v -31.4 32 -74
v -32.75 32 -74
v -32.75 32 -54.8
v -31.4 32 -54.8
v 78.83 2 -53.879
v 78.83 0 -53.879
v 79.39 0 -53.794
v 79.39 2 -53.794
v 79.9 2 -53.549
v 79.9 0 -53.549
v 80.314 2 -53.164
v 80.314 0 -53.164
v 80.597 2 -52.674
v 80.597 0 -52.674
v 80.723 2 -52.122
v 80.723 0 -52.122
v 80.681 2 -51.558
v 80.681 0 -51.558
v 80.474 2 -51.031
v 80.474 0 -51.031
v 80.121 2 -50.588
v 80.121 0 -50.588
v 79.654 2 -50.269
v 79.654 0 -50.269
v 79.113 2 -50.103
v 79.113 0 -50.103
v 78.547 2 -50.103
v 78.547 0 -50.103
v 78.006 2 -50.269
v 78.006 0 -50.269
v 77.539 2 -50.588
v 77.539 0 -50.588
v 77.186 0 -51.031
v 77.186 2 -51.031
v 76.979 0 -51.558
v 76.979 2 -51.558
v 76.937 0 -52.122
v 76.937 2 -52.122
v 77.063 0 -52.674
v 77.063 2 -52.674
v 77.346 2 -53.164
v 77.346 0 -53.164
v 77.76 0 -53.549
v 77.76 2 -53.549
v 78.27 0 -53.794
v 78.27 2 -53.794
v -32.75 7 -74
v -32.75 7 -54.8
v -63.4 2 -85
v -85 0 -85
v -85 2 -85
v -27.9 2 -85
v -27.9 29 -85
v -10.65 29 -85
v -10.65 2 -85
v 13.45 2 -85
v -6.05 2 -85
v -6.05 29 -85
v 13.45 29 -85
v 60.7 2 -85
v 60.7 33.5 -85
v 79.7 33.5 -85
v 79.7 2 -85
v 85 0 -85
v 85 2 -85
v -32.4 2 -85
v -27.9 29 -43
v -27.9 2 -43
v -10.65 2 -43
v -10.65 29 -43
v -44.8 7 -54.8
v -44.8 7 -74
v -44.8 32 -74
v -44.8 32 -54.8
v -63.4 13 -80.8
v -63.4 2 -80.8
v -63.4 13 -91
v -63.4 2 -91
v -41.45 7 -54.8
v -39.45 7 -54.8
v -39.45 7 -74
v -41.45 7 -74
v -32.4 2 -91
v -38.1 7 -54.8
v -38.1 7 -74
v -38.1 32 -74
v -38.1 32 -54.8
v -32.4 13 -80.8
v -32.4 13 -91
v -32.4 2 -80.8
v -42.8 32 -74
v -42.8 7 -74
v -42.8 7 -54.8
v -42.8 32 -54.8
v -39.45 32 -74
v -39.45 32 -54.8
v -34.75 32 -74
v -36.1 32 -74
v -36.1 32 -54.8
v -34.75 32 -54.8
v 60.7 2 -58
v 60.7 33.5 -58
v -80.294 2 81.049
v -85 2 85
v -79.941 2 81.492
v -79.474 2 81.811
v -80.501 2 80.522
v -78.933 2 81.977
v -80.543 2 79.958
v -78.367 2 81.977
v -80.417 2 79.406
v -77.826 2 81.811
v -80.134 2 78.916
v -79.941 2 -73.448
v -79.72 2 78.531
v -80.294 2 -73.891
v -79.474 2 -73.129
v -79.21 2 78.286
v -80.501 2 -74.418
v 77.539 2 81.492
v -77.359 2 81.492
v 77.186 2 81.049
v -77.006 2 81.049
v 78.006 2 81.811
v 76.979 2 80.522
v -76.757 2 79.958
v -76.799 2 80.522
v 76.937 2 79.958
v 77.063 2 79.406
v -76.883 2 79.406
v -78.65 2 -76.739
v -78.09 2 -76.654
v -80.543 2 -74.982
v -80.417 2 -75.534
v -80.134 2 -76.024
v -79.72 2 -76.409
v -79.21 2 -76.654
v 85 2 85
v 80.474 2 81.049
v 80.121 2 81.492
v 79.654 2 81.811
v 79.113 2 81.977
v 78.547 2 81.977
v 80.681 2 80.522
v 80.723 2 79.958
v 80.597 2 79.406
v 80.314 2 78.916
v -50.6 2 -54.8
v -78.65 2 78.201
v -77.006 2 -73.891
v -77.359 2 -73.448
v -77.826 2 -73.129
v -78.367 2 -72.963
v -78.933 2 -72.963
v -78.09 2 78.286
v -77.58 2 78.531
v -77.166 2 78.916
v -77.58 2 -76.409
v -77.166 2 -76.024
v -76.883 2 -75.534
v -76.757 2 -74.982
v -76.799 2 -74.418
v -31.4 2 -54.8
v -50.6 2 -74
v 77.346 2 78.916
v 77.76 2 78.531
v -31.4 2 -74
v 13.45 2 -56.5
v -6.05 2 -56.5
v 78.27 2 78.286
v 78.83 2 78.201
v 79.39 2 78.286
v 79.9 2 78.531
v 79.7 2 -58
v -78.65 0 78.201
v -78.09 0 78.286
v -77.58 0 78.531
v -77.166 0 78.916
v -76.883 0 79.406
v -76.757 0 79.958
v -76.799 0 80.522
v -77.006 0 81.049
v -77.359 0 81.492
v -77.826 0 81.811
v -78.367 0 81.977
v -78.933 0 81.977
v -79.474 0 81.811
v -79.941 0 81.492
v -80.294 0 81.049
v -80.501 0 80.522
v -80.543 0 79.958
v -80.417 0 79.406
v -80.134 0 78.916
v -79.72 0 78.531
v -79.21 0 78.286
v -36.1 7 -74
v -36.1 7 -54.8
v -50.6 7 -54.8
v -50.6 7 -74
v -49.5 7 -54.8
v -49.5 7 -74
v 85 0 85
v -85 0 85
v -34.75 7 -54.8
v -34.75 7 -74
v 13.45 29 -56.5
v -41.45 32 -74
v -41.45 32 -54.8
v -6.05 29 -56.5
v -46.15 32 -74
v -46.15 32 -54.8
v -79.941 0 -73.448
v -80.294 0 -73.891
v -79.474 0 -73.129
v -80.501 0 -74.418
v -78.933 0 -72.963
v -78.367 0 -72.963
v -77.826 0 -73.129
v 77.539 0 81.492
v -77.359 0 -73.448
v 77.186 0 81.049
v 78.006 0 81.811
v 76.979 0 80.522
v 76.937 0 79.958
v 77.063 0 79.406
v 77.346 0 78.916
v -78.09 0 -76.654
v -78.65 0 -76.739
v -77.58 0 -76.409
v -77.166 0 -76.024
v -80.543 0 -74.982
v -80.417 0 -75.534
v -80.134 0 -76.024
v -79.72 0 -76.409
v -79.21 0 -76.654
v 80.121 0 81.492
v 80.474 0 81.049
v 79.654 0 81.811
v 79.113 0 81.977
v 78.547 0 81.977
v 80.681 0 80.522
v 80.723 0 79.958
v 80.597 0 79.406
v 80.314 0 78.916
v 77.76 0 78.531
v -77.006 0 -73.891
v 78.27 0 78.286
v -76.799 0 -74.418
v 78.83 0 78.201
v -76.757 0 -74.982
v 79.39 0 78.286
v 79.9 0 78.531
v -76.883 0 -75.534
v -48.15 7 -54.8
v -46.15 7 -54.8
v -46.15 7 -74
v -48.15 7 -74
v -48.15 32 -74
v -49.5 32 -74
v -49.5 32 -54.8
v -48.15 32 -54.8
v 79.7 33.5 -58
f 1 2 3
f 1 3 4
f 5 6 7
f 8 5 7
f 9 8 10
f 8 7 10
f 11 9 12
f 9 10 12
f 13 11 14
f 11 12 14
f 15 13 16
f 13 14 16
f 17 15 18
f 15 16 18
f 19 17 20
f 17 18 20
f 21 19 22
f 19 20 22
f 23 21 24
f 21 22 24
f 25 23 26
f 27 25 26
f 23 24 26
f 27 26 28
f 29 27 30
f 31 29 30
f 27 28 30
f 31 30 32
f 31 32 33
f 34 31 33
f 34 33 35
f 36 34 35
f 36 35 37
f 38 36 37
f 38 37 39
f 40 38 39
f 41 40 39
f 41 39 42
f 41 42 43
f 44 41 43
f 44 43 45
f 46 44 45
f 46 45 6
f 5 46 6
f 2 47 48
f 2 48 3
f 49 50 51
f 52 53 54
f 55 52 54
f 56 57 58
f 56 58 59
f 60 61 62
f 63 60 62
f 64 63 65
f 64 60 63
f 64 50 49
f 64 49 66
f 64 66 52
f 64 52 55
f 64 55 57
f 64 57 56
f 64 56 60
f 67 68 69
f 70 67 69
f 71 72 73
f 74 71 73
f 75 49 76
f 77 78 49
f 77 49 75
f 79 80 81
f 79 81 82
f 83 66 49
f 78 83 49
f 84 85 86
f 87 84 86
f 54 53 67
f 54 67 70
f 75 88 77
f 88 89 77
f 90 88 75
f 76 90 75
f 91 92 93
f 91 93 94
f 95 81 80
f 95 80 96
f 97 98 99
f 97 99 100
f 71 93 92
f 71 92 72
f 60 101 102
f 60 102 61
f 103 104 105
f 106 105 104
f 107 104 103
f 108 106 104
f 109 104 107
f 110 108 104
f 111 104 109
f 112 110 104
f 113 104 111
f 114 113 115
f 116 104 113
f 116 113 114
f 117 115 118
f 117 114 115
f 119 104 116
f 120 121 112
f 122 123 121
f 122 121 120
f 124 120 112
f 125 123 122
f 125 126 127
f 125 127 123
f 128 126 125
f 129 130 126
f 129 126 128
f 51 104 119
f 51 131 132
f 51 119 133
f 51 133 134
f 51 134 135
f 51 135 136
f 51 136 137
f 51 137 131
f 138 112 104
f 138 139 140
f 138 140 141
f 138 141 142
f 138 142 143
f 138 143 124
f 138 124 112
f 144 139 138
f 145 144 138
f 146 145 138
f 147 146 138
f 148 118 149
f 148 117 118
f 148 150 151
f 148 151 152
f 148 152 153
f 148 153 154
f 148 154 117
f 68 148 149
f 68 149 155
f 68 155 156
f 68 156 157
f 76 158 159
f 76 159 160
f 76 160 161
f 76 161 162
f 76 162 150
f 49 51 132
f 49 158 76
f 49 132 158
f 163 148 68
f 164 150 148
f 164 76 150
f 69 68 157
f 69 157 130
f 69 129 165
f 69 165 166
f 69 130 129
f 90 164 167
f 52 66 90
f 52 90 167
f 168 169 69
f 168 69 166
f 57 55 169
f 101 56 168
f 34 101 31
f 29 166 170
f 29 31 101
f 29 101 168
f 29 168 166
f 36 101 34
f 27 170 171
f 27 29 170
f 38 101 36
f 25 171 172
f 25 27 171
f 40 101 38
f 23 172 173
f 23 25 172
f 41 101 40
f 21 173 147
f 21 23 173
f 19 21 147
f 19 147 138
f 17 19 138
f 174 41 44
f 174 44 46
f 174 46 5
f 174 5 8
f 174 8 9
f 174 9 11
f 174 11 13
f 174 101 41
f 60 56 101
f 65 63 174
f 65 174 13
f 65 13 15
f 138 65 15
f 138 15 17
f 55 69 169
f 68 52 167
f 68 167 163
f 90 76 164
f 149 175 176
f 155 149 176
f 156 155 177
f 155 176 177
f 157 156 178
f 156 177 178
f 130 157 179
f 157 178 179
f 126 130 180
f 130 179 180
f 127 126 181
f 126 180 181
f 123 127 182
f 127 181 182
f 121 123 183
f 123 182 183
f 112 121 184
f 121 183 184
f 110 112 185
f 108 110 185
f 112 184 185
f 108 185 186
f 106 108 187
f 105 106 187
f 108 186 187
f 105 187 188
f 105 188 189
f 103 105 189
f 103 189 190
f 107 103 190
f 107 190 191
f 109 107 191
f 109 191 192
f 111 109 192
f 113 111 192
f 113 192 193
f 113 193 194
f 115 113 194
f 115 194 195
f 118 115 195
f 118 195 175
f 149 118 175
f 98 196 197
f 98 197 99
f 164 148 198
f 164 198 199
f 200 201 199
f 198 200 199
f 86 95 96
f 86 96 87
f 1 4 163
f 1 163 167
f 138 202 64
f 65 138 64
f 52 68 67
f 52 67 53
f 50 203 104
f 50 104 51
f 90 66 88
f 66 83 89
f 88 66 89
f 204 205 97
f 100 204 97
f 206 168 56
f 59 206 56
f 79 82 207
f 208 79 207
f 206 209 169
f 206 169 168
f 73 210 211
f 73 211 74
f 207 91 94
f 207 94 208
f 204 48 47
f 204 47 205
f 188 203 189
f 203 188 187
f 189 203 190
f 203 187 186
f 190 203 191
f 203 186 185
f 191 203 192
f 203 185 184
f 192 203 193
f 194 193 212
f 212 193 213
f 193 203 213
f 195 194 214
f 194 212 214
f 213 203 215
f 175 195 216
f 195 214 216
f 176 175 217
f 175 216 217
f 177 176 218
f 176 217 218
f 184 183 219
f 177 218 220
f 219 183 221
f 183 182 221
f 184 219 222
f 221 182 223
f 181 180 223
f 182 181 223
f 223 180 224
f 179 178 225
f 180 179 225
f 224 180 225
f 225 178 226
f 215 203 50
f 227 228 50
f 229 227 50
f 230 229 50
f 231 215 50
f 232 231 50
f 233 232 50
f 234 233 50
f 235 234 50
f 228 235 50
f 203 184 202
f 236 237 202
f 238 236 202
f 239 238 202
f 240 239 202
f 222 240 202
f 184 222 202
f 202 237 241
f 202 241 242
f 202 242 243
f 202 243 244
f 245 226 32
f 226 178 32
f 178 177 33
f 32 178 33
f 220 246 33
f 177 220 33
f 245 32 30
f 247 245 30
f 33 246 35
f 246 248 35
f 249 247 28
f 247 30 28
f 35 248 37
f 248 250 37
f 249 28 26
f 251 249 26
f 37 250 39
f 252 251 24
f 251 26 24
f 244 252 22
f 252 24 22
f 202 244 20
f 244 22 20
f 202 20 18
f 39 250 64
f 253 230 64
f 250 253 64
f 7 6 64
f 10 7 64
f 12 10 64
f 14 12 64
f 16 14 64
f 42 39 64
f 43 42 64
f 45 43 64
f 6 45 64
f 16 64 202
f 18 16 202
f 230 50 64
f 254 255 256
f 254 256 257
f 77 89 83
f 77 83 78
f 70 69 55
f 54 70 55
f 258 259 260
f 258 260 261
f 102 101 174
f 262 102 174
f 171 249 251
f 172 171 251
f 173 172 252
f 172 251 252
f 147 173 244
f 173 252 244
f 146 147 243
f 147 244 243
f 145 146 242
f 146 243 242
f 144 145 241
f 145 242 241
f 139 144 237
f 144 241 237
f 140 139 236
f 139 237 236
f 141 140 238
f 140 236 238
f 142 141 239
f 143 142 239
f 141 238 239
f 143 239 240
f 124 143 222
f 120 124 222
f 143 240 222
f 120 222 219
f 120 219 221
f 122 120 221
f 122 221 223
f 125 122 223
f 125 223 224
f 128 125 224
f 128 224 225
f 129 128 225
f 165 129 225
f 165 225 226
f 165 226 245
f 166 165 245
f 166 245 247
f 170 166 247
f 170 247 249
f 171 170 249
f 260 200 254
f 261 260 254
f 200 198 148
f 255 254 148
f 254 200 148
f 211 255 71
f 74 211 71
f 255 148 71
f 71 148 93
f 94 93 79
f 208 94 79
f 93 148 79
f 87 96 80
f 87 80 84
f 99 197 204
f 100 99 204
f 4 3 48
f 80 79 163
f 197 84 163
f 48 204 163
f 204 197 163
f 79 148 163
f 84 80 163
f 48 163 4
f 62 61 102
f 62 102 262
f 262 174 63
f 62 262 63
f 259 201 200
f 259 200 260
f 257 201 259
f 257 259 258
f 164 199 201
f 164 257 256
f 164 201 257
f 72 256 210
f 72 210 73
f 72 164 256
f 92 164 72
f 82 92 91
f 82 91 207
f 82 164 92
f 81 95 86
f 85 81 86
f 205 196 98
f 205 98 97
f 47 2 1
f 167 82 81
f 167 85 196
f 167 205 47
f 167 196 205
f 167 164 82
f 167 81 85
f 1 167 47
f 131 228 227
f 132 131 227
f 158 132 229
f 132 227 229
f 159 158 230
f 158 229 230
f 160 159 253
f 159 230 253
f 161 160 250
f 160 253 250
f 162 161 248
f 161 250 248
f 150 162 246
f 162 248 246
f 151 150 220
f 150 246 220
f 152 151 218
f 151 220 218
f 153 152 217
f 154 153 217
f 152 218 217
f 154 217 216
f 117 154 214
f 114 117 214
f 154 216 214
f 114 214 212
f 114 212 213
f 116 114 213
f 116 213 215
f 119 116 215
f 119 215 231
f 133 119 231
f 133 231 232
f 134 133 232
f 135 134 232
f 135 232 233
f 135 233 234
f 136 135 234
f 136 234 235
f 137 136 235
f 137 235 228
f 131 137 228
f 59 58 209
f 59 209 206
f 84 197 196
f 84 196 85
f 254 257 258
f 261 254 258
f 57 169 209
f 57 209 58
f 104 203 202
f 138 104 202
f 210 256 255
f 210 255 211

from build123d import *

# Parameters (mm, degrees)
SKETCH1_W                = 170
SKETCH1_H                = 170
BOSS_EXTRUDE1_DEPTH      = 2
F_6_CLEARANCE_HOLE1_D    = 3.7973
SKETCH5_W                = 19
SKETCH5_H                = 27
BOSS_EXTRUDE2_DEPTH      = 31.5
SKETCH6_W                = 19.5
SKETCH6_H                = 28.5
SKETCH6_W_2              = 17.25
SKETCH6_H_2              = 42
BOSS_EXTRUDE3_DEPTH      = 27
SKETCH7_W                = 19.2
SKETCH7_H                = 19.2
BOSS_EXTRUDE4_DEPTH      = 30
SKETCH8_W                = 2
SKETCH8_H                = 25
SKETCH8_W_2              = 1.1
CUT_EXTRUDE1_DEPTH       = 160
SKETCH9_W                = 31
SKETCH9_H                = 11
BOSS_EXTRUDE5_DEPTH      = 6
BOSS_EXTRUDE5_DEPTH_BACK = 4.2


with BuildPart() as part:
    # Sketch1 → Boss-Extrude1 (new body)
    with BuildSketch(Plane(origin=(0, 0, 0), x_dir=(1, 0, 0), z_dir=(0, 1, 0))):
        Rectangle(SKETCH1_W, SKETCH1_H)
    extrude(amount=BOSS_EXTRUDE1_DEPTH)

    # #6 Clearance Hole1 (through all)
    with Locations(Plane(origin=(-78.65, 2, -74.84), x_dir=(0, 0, 1), z_dir=(0, 1, 0))):
        with Locations((0, 0), (154.94, 0), (154.94, 157.48), (22.86, 157.48)):
            Hole(F_6_CLEARANCE_HOLE1_D / 2)

    # Sketch5 → Boss-Extrude2 (add)
    with BuildSketch(Plane(origin=(0, 2, 0), x_dir=(1, 0, 0), z_dir=(0, 1, 0))):
        with Locations((70.2, 71.5)):
            Rectangle(SKETCH5_W, SKETCH5_H)
    extrude(amount=BOSS_EXTRUDE2_DEPTH)

    # Sketch6 → Boss-Extrude3 (add)
    with BuildSketch(Plane(origin=(0, 2, 0), x_dir=(1, 0, 0), z_dir=(0, 1, 0))):
        with Locations((3.7, 70.75)):
            Rectangle(SKETCH6_W, SKETCH6_H)
        with Locations((-19.275, 64)):
            Rectangle(SKETCH6_W_2, SKETCH6_H_2)
    extrude(amount=BOSS_EXTRUDE3_DEPTH)

    # Sketch7 → Boss-Extrude4 (add)
    with BuildSketch(Plane(origin=(0, 2, 0), x_dir=(1, 0, 0), z_dir=(0, 1, 0))):
        with Locations((-41, 64.4)):
            Rectangle(SKETCH7_W, SKETCH7_H)
    extrude(amount=BOSS_EXTRUDE4_DEPTH)

    # Sketch8 → Cut-Extrude1 (cut, through all)
    with BuildSketch(Plane(origin=(0, 0, -74), x_dir=(-1, 0, 0), z_dir=(0, 0, -1))):
        with Locations((33.75, 19.5)):
            Rectangle(SKETCH8_W, SKETCH8_H)
        with Locations((37.1, 19.5)):
            Rectangle(SKETCH8_W, SKETCH8_H)
        with Locations((50.05, 19.5)):
            Rectangle(SKETCH8_W_2, SKETCH8_H)
        with Locations((40.45, 19.5)):
            Rectangle(SKETCH8_W, SKETCH8_H)
        with Locations((47.15, 19.5)):
            Rectangle(SKETCH8_W, SKETCH8_H)
        with Locations((43.8, 19.5)):
            Rectangle(SKETCH8_W, SKETCH8_H)
    extrude(amount=-CUT_EXTRUDE1_DEPTH, mode=Mode.SUBTRACT)

    # Sketch9 → Boss-Extrude5 (add, two sides)
    with BuildSketch(Plane(origin=(0, 0, -85), x_dir=(-1, 0, 0), z_dir=(0, 0, -1))) as boss_extrude5_sk:
        with Locations((47.9, 7.5)):
            Rectangle(SKETCH9_W, SKETCH9_H)
    extrude(amount=BOSS_EXTRUDE5_DEPTH)
    extrude(boss_extrude5_sk.sketch, amount=-BOSS_EXTRUDE5_DEPTH_BACK)


solid = part.part
